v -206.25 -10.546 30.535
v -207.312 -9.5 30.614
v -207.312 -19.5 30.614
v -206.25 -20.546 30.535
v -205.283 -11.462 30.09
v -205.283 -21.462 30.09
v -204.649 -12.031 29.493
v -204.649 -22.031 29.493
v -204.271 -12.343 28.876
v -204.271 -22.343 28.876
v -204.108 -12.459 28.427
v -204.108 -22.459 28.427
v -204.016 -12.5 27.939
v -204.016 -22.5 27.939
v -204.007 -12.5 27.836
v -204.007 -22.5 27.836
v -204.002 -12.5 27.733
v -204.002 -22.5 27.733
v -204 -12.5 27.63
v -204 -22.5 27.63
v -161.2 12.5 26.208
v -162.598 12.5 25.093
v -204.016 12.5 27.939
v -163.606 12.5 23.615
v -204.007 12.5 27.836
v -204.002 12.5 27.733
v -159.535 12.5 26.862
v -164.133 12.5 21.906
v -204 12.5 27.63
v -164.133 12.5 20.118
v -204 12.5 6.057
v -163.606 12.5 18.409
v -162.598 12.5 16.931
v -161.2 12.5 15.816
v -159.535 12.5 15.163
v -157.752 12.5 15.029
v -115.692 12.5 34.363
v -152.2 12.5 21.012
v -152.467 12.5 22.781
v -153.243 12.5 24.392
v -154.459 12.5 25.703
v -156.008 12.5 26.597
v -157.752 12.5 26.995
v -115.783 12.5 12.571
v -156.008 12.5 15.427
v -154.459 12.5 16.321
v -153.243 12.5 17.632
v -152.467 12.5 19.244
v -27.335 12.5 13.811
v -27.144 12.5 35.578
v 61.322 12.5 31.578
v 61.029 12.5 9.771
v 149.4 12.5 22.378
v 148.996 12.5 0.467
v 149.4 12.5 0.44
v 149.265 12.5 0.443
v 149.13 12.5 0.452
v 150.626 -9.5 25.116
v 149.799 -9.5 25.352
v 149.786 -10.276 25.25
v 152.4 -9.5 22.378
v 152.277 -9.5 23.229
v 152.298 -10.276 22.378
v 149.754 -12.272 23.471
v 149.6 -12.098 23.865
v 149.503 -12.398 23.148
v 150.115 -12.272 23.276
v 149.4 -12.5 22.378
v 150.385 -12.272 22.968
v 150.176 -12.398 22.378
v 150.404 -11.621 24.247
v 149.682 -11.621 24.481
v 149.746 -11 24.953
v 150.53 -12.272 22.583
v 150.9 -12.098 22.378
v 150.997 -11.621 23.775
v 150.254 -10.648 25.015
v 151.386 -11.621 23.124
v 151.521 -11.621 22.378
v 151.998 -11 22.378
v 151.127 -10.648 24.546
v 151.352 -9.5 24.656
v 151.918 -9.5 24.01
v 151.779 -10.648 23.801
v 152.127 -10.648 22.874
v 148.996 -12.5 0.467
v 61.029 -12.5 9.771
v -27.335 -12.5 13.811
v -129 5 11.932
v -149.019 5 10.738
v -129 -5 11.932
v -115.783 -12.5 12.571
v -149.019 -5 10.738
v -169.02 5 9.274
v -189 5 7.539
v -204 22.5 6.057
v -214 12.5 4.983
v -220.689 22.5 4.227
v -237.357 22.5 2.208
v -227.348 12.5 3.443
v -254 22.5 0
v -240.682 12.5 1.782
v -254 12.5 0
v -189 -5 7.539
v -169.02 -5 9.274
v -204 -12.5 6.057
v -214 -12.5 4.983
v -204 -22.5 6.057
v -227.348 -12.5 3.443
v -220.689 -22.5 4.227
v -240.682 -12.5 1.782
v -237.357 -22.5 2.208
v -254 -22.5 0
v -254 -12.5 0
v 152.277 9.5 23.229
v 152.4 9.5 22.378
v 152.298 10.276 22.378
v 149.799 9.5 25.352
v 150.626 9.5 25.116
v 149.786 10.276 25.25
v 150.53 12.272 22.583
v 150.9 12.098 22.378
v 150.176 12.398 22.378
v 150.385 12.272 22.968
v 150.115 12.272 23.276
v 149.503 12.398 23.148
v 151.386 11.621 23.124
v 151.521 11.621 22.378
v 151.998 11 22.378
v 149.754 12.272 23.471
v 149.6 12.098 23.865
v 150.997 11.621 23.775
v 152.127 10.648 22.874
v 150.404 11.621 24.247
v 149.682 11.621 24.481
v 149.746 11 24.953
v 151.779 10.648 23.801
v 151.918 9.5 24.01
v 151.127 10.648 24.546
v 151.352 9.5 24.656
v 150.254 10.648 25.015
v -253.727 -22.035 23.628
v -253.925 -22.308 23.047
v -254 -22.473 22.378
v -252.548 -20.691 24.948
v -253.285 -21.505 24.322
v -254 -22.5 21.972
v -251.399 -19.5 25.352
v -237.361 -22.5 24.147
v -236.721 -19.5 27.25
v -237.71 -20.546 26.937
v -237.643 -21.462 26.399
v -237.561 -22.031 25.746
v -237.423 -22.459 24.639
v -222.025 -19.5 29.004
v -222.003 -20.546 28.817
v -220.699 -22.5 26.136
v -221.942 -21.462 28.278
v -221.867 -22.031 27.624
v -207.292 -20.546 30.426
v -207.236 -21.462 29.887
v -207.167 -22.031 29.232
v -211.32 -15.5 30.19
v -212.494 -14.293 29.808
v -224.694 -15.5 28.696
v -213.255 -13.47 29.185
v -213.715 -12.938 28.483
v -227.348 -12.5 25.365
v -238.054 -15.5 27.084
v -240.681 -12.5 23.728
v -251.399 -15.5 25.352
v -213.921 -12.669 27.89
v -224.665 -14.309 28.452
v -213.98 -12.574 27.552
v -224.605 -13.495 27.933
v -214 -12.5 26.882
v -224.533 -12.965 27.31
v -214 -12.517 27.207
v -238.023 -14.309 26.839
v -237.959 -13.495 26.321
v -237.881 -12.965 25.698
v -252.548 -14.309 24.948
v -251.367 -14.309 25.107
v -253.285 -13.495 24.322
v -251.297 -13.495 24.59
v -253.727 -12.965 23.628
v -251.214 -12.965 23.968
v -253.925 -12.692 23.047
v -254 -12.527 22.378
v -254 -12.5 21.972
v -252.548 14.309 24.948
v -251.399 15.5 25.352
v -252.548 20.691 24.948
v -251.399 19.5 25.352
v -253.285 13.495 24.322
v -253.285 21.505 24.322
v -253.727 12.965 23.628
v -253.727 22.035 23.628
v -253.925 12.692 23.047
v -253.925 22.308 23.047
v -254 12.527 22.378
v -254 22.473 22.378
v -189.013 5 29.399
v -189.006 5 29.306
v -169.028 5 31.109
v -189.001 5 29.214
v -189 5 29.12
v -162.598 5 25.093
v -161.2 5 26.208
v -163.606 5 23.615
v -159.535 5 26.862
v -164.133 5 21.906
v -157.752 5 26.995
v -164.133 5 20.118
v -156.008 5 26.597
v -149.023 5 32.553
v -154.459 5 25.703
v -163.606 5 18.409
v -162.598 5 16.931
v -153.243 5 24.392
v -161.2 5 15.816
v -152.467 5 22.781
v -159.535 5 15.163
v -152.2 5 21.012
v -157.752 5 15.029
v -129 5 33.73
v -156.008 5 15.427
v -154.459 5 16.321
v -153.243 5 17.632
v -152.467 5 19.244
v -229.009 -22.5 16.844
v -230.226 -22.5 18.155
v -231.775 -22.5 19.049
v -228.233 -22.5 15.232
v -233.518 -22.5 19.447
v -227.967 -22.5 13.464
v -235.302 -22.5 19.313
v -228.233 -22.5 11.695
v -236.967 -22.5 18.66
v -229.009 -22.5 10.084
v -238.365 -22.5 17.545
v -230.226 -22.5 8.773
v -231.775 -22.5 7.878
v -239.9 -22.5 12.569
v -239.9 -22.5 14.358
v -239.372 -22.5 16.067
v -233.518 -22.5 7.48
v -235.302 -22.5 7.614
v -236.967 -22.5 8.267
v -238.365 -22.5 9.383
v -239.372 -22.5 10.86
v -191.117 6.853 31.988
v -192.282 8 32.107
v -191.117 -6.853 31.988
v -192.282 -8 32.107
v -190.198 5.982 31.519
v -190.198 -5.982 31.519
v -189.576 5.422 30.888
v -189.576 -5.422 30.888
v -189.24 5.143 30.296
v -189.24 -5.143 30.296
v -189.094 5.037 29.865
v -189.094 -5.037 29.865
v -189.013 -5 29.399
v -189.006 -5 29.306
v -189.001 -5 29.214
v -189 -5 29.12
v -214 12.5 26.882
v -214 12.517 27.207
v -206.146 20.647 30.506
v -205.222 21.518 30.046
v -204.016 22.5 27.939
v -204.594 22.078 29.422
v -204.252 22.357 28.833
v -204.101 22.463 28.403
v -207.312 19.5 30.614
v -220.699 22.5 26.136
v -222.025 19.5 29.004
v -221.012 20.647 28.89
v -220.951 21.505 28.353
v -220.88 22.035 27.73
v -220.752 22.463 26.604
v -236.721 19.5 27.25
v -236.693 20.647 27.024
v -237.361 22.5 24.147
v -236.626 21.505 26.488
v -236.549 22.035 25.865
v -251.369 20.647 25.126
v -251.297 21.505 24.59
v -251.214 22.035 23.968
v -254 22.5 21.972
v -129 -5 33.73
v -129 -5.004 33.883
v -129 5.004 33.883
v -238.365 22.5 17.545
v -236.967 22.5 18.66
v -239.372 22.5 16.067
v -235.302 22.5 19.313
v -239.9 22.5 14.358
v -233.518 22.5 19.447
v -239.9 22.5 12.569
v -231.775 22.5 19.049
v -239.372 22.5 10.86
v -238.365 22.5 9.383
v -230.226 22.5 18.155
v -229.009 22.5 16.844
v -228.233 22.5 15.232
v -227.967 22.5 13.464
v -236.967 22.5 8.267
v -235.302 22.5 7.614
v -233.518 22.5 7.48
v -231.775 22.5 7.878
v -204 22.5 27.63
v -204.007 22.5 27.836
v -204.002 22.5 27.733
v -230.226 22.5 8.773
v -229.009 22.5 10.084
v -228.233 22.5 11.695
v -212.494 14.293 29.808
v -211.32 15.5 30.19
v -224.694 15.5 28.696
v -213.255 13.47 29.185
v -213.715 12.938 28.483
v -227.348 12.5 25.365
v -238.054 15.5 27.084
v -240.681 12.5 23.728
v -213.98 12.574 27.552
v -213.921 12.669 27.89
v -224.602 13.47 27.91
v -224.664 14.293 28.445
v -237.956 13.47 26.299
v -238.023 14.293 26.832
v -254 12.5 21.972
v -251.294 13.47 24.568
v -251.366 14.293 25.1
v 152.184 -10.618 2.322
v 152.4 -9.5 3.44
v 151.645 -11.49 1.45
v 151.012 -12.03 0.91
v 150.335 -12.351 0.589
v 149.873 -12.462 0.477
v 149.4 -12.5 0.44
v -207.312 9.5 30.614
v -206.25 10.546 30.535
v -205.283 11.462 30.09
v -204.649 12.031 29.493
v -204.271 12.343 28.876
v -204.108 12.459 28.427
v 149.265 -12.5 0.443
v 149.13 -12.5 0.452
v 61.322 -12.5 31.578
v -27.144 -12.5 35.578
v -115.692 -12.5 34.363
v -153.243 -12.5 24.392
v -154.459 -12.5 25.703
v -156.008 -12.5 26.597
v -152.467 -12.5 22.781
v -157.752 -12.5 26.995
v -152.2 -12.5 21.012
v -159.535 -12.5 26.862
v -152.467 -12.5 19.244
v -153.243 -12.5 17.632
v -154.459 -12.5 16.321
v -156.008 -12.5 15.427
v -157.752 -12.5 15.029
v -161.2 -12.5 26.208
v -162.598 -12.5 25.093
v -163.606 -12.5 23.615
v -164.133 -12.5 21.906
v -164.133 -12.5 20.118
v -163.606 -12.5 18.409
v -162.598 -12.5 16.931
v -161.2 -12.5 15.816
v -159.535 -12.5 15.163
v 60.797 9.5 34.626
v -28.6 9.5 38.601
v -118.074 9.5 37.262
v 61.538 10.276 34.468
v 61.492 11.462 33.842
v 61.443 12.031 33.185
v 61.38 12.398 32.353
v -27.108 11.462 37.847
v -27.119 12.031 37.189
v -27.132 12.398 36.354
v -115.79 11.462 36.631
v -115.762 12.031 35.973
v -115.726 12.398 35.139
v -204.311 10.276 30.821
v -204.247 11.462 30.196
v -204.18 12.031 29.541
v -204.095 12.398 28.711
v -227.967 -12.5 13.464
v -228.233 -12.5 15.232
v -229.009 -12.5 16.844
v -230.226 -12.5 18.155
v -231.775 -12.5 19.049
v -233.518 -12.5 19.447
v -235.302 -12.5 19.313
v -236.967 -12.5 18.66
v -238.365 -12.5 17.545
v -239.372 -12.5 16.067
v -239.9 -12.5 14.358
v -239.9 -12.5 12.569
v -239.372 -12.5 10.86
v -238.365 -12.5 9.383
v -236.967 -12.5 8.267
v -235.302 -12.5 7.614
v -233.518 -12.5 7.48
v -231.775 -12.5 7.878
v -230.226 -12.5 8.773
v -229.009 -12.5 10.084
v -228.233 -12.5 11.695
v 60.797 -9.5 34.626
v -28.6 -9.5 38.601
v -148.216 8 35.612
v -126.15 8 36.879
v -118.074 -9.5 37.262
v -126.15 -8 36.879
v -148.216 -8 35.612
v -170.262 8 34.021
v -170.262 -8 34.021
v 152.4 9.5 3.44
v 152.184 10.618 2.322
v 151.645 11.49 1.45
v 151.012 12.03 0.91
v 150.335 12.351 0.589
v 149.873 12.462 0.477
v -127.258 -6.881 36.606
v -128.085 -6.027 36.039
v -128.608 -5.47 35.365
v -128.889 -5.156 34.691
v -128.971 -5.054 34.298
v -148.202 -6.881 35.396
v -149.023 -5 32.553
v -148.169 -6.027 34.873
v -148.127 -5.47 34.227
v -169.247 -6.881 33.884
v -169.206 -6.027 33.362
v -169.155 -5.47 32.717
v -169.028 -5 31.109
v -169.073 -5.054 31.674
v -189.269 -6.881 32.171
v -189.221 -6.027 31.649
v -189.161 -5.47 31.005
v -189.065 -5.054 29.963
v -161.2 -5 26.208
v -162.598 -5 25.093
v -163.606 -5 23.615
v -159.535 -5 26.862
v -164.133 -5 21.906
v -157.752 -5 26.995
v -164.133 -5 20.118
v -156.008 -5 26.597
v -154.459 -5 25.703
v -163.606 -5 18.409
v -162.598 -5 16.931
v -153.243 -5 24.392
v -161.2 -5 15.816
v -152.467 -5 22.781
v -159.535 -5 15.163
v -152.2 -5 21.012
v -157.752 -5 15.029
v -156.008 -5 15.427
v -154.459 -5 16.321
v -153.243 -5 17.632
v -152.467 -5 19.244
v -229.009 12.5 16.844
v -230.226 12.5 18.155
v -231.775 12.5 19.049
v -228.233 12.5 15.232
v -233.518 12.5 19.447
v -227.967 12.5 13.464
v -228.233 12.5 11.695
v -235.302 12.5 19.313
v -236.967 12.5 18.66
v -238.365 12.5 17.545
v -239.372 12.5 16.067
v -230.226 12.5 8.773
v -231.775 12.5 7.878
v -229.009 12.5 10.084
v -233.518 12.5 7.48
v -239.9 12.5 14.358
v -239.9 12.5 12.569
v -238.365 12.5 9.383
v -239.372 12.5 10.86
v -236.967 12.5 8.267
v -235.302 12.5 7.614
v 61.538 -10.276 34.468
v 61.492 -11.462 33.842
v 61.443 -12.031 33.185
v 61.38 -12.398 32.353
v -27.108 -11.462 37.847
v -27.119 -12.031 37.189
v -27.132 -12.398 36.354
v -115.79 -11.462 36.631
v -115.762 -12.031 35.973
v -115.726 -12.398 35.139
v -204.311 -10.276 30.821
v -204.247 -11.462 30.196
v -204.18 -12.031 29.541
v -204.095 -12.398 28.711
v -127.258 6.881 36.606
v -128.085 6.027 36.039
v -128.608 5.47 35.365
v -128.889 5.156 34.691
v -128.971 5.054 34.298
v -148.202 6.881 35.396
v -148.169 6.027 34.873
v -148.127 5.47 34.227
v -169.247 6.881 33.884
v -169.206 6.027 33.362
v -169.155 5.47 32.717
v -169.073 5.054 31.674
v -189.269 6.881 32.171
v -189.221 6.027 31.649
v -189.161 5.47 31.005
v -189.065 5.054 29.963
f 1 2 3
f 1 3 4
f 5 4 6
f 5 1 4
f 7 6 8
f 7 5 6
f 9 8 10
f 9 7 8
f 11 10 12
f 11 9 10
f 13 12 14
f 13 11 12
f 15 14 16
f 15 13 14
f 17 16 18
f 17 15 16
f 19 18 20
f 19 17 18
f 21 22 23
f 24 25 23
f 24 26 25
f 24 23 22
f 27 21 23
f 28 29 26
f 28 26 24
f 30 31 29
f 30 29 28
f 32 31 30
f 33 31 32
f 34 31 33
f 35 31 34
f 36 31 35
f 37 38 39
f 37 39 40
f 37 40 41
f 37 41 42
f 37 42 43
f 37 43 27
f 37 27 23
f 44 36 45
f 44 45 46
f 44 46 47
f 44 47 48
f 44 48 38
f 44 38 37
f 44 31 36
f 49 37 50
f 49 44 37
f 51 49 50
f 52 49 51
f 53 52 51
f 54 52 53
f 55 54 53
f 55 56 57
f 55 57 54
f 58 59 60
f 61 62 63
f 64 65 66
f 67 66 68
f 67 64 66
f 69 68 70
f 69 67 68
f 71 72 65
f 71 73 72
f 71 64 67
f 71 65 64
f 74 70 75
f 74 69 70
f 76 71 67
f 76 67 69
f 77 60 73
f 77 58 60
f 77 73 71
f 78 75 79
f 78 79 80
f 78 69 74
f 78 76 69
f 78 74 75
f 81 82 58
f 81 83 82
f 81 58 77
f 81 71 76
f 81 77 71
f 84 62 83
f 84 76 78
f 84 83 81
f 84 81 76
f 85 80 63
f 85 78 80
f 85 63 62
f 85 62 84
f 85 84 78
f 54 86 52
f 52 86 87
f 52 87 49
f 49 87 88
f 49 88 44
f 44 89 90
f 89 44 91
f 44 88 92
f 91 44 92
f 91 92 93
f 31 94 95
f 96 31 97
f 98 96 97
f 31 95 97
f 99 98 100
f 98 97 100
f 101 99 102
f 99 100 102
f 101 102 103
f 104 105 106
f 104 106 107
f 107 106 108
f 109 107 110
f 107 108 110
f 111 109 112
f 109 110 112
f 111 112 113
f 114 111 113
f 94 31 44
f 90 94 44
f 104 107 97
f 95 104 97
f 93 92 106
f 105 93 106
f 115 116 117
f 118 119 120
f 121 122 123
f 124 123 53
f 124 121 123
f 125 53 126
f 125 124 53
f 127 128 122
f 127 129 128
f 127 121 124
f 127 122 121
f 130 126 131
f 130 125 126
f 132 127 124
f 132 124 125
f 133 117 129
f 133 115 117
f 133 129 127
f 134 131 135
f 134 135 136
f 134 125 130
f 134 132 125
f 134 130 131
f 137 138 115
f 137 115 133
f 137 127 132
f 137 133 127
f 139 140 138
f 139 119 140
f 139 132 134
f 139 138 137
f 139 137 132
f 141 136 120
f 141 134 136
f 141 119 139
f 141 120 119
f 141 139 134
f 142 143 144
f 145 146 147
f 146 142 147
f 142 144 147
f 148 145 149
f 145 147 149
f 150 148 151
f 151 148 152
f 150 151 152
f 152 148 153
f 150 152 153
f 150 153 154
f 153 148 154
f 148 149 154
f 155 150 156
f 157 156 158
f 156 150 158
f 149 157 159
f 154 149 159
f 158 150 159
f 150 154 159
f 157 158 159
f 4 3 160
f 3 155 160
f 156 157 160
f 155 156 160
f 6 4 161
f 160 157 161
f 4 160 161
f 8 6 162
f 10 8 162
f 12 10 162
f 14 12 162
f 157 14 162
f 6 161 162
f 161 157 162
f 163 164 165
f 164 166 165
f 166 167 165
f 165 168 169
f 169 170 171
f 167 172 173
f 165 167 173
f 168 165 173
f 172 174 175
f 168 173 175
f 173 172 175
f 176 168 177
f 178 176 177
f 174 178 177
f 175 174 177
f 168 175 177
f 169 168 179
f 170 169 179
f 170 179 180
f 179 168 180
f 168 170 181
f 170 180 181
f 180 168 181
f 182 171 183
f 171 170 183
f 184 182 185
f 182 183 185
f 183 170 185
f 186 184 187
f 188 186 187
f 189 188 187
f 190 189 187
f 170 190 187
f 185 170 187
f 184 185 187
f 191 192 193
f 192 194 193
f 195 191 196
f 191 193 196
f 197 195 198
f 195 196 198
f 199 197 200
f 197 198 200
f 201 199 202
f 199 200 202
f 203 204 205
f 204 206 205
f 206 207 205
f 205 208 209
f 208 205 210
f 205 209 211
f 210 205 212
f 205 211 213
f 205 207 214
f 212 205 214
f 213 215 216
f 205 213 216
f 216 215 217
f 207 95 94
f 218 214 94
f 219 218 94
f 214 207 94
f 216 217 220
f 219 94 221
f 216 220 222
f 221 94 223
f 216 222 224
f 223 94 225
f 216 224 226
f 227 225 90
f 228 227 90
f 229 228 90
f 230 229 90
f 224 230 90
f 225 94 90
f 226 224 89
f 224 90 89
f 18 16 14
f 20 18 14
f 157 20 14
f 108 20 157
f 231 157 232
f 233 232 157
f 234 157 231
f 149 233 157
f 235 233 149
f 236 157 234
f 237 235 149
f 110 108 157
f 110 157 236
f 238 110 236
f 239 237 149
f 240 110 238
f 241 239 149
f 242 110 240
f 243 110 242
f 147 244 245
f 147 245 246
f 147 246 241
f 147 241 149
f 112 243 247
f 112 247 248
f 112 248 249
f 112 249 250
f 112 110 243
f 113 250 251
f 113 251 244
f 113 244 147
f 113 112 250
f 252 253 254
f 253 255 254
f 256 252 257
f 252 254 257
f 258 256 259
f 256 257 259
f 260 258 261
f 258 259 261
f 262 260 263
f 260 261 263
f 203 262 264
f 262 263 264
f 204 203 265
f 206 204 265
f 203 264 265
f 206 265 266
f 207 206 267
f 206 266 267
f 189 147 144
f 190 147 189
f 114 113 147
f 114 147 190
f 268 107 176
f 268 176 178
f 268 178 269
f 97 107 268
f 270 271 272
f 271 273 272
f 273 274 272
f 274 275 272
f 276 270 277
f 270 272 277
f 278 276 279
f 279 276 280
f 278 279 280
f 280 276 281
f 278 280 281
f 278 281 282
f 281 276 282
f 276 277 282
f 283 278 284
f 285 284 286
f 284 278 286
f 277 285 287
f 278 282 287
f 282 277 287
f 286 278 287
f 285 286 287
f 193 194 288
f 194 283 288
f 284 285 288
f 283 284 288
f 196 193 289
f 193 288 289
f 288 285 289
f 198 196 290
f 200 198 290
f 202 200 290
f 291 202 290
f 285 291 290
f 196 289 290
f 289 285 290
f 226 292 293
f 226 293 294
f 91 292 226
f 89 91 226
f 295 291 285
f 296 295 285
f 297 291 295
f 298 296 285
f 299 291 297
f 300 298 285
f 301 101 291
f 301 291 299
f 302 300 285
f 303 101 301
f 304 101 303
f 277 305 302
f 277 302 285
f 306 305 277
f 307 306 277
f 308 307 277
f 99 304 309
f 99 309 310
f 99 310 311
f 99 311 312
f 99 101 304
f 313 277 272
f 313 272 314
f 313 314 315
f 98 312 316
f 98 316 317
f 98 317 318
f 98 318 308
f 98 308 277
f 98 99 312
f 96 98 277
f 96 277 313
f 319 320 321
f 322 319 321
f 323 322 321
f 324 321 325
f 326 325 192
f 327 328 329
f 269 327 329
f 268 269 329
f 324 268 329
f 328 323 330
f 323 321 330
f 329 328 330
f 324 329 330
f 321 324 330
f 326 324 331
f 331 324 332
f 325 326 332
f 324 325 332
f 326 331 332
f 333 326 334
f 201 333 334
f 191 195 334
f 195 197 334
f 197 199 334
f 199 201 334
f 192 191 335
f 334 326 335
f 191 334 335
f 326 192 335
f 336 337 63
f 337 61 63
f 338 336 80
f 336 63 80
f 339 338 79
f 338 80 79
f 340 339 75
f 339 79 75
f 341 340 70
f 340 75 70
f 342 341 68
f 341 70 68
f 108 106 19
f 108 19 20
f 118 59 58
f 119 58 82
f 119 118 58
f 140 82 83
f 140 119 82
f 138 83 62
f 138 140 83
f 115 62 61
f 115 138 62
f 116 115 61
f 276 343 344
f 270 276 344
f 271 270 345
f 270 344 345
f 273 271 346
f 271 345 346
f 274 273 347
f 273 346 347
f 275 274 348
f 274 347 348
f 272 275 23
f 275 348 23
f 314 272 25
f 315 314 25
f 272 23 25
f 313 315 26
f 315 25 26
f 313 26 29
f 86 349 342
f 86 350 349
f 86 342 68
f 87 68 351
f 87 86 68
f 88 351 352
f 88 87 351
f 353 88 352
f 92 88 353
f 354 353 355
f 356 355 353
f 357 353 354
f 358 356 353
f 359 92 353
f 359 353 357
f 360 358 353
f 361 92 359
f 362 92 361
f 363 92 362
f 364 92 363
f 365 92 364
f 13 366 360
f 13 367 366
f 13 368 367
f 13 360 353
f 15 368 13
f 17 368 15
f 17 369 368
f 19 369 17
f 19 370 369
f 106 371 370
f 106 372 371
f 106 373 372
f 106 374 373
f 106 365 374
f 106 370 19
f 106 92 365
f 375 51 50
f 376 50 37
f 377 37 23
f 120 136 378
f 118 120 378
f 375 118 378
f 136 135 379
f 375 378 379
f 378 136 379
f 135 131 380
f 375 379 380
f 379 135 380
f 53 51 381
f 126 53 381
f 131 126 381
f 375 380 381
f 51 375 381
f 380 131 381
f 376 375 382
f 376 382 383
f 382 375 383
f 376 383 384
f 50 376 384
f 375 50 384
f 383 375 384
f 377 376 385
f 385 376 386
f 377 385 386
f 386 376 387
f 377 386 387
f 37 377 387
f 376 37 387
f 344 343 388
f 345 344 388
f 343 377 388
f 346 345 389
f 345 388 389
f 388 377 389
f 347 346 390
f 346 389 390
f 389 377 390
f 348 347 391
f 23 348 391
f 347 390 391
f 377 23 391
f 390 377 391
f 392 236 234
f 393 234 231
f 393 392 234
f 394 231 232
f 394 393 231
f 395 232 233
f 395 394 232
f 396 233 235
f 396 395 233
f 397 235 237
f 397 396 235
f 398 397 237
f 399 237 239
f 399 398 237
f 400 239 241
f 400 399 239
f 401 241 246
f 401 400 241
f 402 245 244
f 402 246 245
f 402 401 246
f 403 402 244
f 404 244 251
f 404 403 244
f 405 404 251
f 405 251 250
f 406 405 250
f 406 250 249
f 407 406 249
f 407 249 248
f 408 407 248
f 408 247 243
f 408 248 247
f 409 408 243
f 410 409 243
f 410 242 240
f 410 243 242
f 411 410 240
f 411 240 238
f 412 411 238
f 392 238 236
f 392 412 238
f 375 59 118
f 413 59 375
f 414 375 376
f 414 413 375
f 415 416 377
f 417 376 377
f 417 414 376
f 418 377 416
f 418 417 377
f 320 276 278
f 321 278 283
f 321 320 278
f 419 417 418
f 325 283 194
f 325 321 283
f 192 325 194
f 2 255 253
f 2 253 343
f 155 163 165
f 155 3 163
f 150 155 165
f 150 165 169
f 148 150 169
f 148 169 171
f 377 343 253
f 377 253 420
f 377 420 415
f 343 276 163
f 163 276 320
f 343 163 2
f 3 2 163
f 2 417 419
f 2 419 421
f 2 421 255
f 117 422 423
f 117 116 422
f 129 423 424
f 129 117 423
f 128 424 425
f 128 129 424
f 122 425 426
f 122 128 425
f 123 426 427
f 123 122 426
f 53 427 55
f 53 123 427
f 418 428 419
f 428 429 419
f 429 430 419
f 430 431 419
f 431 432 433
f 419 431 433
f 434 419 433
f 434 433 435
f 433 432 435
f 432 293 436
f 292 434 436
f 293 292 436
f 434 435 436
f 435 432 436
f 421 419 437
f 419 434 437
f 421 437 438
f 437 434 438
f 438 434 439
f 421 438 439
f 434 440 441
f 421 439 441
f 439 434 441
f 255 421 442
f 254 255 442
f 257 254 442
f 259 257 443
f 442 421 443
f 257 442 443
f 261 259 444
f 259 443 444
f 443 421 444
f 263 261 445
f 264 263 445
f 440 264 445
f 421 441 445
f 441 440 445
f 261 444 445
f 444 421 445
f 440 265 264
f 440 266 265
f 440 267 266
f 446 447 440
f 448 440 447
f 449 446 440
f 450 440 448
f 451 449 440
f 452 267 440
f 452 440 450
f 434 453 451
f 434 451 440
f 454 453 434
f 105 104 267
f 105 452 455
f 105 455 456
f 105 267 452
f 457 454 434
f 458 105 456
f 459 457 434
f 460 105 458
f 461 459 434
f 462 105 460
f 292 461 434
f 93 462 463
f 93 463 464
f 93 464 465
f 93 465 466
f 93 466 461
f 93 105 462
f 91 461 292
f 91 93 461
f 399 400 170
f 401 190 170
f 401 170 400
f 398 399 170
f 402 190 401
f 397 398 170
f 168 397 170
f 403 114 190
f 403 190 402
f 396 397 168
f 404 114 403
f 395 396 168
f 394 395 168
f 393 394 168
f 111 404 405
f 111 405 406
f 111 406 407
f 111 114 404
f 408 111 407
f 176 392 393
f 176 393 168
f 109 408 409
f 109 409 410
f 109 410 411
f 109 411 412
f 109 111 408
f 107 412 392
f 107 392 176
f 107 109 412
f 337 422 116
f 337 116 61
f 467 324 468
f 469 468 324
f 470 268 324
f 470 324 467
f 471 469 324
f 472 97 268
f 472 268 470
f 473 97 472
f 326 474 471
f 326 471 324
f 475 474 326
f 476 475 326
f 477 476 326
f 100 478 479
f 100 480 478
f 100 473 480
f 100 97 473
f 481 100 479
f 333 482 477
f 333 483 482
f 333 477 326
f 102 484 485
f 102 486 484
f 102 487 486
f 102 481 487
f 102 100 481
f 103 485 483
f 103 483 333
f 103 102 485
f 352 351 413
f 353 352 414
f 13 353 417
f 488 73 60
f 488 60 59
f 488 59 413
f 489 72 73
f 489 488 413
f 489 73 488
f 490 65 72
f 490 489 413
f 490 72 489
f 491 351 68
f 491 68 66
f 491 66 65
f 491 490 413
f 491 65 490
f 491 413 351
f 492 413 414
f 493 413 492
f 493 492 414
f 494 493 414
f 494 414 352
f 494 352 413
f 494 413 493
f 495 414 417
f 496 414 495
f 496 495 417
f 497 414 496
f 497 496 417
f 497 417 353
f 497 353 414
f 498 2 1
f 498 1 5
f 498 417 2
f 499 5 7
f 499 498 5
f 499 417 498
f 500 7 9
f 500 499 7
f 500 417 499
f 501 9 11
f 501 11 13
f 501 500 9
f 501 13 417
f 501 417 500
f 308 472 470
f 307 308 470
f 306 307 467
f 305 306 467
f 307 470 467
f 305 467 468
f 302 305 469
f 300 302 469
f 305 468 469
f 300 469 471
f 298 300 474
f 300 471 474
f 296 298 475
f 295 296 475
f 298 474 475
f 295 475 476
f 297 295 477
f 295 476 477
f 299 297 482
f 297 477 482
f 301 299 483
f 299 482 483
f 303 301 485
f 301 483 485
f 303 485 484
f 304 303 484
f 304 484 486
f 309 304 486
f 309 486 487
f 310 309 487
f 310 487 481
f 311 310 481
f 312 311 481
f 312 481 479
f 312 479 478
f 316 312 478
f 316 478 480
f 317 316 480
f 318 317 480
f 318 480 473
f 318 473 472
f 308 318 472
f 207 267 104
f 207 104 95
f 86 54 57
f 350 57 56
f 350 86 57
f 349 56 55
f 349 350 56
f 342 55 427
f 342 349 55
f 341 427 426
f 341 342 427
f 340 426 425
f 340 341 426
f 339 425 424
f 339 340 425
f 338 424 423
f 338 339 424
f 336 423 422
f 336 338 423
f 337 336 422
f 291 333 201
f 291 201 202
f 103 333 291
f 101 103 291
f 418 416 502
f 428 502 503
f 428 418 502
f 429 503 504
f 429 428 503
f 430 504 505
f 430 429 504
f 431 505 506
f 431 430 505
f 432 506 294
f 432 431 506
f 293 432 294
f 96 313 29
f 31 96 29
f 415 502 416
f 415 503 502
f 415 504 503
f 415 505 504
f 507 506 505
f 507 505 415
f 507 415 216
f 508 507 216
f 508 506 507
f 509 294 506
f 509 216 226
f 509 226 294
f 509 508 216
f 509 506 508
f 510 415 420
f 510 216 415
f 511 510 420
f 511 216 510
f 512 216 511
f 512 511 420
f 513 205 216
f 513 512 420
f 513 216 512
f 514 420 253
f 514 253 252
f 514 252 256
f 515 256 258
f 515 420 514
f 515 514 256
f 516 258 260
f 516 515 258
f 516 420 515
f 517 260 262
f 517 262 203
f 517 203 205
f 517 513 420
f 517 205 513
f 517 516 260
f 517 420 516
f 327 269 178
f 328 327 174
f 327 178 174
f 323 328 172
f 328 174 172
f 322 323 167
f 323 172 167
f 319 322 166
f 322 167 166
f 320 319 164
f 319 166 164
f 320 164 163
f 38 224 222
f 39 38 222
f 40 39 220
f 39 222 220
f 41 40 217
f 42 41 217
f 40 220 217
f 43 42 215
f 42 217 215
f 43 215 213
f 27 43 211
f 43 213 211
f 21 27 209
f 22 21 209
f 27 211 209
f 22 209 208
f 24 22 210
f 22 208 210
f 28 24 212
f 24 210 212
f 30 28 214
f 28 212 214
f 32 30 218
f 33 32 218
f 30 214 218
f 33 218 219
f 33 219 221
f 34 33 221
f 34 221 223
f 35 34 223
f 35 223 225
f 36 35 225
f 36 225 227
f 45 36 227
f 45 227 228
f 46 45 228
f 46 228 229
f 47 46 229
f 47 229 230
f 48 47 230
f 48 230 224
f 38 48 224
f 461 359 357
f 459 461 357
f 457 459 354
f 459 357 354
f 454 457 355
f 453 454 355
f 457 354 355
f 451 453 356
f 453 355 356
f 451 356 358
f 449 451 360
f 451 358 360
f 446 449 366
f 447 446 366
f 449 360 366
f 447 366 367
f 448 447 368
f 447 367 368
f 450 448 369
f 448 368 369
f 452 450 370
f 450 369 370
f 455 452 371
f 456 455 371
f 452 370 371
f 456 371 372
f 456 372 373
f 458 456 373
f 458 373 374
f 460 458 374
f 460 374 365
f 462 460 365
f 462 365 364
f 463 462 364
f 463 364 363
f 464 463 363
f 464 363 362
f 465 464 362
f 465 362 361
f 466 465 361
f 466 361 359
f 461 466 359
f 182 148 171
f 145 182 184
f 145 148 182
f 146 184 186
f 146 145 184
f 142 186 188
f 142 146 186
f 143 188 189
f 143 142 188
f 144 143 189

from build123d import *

# Parameters (mm, degrees)
SKETCH011_W          = 60
SKETCH011_H          = 10
PAD005_DEPTH         = 40
POCKET002_DEPTH      = 35.001
POCKET002_DEPTH_BACK = 10.001
FILLET002_R          = 3
SKETCH013_R          = 6
POCKET003_DEPTH      = 35.001
POCKET003_DEPTH_BACK = 10.001


with BuildPart() as part:
    # Sketch011 → Pad005 (new body)
    with BuildSketch(Plane.XY):
        Polygon((-214, -12.5), (-214, 12.5), (-254, 12.5), (-254, 22.5), (-204, 22.5), (-204, 12.5), (152.4, 12.5), (152.4, -12.5), (-204, -12.5), (-204, -22.5), (-254, -22.5), (-254, -12.5), align=None)
        with Locations((-159, 0)):
            Rectangle(SKETCH011_W, SKETCH011_H, mode=Mode.SUBTRACT)
    extrude(amount=PAD005_DEPTH)

    # Sketch012 (on Face10 of Pad005) → Pocket002 (cut, two sides)
    with BuildSketch(Plane.XZ.offset(12.5)) as pocket002_sk:
        with BuildLine():
            ThreePointArc((152.4, 0), (-50.8, 13.99639), (-254, 0))
            Line((-254, 0), (152.4, 0))
        make_face()
        with BuildLine():
            ThreePointArc((152.4, 25), (-50.8, 38.764187), (-254, 25))
            Line((-254, 25), (-254, 40))
            Line((-254, 40), (152.4, 40))
            Line((152.4, 40), (152.4, 25))
        make_face()
    extrude(amount=-POCKET002_DEPTH, mode=Mode.SUBTRACT)
    extrude(pocket002_sk.sketch, amount=POCKET002_DEPTH_BACK, mode=Mode.SUBTRACT)

    # Fillet002
    fillet002_edges = [part.edges().sort_by_distance(p)[0] for p in [
        (152.4, 0, 0),
        (152.4, -12.5, 12.5),
        (152.4, 0, 25),
        (152.4, 12.5, 12.5),
        (-25.623265, -12.5, 38.553836),
        (-204, -17.5, 30.955836),
        (-229.02488, -22.5, 28.186792),
        (-254, -17.5, 25),
        (-234.016382, -12.5, 27.583774),
        (-214, 0, 29.900087),
        (-234.016382, 12.5, 27.583774),
        (-254, 17.5, 25),
        (-229.02488, 22.5, 28.186792),
        (-204, 17.5, 30.955836),
        (-25.623265, 12.5, 38.553836),
        (-189, 0, 32.41311),
        (-159.021563, -5, 34.872806),
        (-129, 0, 36.733601),
        (-159.021563, 5, 34.872806),
    ]]
    fillet(fillet002_edges, radius=FILLET002_R)

    # Sketch013 (on Face11 of Fillet002) → Pocket003 (cut, two sides)
    with BuildSketch(Plane.XZ.offset(12.5)) as pocket003_sk:
        with Locations((-158.200104, 21.012099)):
            Circle(SKETCH013_R)
        with Locations((-233.96661, 13.463589)):
            Circle(SKETCH013_R)
    extrude(amount=-POCKET003_DEPTH, mode=Mode.SUBTRACT)
    extrude(pocket003_sk.sketch, amount=POCKET003_DEPTH_BACK, mode=Mode.SUBTRACT)


solid = part.part
